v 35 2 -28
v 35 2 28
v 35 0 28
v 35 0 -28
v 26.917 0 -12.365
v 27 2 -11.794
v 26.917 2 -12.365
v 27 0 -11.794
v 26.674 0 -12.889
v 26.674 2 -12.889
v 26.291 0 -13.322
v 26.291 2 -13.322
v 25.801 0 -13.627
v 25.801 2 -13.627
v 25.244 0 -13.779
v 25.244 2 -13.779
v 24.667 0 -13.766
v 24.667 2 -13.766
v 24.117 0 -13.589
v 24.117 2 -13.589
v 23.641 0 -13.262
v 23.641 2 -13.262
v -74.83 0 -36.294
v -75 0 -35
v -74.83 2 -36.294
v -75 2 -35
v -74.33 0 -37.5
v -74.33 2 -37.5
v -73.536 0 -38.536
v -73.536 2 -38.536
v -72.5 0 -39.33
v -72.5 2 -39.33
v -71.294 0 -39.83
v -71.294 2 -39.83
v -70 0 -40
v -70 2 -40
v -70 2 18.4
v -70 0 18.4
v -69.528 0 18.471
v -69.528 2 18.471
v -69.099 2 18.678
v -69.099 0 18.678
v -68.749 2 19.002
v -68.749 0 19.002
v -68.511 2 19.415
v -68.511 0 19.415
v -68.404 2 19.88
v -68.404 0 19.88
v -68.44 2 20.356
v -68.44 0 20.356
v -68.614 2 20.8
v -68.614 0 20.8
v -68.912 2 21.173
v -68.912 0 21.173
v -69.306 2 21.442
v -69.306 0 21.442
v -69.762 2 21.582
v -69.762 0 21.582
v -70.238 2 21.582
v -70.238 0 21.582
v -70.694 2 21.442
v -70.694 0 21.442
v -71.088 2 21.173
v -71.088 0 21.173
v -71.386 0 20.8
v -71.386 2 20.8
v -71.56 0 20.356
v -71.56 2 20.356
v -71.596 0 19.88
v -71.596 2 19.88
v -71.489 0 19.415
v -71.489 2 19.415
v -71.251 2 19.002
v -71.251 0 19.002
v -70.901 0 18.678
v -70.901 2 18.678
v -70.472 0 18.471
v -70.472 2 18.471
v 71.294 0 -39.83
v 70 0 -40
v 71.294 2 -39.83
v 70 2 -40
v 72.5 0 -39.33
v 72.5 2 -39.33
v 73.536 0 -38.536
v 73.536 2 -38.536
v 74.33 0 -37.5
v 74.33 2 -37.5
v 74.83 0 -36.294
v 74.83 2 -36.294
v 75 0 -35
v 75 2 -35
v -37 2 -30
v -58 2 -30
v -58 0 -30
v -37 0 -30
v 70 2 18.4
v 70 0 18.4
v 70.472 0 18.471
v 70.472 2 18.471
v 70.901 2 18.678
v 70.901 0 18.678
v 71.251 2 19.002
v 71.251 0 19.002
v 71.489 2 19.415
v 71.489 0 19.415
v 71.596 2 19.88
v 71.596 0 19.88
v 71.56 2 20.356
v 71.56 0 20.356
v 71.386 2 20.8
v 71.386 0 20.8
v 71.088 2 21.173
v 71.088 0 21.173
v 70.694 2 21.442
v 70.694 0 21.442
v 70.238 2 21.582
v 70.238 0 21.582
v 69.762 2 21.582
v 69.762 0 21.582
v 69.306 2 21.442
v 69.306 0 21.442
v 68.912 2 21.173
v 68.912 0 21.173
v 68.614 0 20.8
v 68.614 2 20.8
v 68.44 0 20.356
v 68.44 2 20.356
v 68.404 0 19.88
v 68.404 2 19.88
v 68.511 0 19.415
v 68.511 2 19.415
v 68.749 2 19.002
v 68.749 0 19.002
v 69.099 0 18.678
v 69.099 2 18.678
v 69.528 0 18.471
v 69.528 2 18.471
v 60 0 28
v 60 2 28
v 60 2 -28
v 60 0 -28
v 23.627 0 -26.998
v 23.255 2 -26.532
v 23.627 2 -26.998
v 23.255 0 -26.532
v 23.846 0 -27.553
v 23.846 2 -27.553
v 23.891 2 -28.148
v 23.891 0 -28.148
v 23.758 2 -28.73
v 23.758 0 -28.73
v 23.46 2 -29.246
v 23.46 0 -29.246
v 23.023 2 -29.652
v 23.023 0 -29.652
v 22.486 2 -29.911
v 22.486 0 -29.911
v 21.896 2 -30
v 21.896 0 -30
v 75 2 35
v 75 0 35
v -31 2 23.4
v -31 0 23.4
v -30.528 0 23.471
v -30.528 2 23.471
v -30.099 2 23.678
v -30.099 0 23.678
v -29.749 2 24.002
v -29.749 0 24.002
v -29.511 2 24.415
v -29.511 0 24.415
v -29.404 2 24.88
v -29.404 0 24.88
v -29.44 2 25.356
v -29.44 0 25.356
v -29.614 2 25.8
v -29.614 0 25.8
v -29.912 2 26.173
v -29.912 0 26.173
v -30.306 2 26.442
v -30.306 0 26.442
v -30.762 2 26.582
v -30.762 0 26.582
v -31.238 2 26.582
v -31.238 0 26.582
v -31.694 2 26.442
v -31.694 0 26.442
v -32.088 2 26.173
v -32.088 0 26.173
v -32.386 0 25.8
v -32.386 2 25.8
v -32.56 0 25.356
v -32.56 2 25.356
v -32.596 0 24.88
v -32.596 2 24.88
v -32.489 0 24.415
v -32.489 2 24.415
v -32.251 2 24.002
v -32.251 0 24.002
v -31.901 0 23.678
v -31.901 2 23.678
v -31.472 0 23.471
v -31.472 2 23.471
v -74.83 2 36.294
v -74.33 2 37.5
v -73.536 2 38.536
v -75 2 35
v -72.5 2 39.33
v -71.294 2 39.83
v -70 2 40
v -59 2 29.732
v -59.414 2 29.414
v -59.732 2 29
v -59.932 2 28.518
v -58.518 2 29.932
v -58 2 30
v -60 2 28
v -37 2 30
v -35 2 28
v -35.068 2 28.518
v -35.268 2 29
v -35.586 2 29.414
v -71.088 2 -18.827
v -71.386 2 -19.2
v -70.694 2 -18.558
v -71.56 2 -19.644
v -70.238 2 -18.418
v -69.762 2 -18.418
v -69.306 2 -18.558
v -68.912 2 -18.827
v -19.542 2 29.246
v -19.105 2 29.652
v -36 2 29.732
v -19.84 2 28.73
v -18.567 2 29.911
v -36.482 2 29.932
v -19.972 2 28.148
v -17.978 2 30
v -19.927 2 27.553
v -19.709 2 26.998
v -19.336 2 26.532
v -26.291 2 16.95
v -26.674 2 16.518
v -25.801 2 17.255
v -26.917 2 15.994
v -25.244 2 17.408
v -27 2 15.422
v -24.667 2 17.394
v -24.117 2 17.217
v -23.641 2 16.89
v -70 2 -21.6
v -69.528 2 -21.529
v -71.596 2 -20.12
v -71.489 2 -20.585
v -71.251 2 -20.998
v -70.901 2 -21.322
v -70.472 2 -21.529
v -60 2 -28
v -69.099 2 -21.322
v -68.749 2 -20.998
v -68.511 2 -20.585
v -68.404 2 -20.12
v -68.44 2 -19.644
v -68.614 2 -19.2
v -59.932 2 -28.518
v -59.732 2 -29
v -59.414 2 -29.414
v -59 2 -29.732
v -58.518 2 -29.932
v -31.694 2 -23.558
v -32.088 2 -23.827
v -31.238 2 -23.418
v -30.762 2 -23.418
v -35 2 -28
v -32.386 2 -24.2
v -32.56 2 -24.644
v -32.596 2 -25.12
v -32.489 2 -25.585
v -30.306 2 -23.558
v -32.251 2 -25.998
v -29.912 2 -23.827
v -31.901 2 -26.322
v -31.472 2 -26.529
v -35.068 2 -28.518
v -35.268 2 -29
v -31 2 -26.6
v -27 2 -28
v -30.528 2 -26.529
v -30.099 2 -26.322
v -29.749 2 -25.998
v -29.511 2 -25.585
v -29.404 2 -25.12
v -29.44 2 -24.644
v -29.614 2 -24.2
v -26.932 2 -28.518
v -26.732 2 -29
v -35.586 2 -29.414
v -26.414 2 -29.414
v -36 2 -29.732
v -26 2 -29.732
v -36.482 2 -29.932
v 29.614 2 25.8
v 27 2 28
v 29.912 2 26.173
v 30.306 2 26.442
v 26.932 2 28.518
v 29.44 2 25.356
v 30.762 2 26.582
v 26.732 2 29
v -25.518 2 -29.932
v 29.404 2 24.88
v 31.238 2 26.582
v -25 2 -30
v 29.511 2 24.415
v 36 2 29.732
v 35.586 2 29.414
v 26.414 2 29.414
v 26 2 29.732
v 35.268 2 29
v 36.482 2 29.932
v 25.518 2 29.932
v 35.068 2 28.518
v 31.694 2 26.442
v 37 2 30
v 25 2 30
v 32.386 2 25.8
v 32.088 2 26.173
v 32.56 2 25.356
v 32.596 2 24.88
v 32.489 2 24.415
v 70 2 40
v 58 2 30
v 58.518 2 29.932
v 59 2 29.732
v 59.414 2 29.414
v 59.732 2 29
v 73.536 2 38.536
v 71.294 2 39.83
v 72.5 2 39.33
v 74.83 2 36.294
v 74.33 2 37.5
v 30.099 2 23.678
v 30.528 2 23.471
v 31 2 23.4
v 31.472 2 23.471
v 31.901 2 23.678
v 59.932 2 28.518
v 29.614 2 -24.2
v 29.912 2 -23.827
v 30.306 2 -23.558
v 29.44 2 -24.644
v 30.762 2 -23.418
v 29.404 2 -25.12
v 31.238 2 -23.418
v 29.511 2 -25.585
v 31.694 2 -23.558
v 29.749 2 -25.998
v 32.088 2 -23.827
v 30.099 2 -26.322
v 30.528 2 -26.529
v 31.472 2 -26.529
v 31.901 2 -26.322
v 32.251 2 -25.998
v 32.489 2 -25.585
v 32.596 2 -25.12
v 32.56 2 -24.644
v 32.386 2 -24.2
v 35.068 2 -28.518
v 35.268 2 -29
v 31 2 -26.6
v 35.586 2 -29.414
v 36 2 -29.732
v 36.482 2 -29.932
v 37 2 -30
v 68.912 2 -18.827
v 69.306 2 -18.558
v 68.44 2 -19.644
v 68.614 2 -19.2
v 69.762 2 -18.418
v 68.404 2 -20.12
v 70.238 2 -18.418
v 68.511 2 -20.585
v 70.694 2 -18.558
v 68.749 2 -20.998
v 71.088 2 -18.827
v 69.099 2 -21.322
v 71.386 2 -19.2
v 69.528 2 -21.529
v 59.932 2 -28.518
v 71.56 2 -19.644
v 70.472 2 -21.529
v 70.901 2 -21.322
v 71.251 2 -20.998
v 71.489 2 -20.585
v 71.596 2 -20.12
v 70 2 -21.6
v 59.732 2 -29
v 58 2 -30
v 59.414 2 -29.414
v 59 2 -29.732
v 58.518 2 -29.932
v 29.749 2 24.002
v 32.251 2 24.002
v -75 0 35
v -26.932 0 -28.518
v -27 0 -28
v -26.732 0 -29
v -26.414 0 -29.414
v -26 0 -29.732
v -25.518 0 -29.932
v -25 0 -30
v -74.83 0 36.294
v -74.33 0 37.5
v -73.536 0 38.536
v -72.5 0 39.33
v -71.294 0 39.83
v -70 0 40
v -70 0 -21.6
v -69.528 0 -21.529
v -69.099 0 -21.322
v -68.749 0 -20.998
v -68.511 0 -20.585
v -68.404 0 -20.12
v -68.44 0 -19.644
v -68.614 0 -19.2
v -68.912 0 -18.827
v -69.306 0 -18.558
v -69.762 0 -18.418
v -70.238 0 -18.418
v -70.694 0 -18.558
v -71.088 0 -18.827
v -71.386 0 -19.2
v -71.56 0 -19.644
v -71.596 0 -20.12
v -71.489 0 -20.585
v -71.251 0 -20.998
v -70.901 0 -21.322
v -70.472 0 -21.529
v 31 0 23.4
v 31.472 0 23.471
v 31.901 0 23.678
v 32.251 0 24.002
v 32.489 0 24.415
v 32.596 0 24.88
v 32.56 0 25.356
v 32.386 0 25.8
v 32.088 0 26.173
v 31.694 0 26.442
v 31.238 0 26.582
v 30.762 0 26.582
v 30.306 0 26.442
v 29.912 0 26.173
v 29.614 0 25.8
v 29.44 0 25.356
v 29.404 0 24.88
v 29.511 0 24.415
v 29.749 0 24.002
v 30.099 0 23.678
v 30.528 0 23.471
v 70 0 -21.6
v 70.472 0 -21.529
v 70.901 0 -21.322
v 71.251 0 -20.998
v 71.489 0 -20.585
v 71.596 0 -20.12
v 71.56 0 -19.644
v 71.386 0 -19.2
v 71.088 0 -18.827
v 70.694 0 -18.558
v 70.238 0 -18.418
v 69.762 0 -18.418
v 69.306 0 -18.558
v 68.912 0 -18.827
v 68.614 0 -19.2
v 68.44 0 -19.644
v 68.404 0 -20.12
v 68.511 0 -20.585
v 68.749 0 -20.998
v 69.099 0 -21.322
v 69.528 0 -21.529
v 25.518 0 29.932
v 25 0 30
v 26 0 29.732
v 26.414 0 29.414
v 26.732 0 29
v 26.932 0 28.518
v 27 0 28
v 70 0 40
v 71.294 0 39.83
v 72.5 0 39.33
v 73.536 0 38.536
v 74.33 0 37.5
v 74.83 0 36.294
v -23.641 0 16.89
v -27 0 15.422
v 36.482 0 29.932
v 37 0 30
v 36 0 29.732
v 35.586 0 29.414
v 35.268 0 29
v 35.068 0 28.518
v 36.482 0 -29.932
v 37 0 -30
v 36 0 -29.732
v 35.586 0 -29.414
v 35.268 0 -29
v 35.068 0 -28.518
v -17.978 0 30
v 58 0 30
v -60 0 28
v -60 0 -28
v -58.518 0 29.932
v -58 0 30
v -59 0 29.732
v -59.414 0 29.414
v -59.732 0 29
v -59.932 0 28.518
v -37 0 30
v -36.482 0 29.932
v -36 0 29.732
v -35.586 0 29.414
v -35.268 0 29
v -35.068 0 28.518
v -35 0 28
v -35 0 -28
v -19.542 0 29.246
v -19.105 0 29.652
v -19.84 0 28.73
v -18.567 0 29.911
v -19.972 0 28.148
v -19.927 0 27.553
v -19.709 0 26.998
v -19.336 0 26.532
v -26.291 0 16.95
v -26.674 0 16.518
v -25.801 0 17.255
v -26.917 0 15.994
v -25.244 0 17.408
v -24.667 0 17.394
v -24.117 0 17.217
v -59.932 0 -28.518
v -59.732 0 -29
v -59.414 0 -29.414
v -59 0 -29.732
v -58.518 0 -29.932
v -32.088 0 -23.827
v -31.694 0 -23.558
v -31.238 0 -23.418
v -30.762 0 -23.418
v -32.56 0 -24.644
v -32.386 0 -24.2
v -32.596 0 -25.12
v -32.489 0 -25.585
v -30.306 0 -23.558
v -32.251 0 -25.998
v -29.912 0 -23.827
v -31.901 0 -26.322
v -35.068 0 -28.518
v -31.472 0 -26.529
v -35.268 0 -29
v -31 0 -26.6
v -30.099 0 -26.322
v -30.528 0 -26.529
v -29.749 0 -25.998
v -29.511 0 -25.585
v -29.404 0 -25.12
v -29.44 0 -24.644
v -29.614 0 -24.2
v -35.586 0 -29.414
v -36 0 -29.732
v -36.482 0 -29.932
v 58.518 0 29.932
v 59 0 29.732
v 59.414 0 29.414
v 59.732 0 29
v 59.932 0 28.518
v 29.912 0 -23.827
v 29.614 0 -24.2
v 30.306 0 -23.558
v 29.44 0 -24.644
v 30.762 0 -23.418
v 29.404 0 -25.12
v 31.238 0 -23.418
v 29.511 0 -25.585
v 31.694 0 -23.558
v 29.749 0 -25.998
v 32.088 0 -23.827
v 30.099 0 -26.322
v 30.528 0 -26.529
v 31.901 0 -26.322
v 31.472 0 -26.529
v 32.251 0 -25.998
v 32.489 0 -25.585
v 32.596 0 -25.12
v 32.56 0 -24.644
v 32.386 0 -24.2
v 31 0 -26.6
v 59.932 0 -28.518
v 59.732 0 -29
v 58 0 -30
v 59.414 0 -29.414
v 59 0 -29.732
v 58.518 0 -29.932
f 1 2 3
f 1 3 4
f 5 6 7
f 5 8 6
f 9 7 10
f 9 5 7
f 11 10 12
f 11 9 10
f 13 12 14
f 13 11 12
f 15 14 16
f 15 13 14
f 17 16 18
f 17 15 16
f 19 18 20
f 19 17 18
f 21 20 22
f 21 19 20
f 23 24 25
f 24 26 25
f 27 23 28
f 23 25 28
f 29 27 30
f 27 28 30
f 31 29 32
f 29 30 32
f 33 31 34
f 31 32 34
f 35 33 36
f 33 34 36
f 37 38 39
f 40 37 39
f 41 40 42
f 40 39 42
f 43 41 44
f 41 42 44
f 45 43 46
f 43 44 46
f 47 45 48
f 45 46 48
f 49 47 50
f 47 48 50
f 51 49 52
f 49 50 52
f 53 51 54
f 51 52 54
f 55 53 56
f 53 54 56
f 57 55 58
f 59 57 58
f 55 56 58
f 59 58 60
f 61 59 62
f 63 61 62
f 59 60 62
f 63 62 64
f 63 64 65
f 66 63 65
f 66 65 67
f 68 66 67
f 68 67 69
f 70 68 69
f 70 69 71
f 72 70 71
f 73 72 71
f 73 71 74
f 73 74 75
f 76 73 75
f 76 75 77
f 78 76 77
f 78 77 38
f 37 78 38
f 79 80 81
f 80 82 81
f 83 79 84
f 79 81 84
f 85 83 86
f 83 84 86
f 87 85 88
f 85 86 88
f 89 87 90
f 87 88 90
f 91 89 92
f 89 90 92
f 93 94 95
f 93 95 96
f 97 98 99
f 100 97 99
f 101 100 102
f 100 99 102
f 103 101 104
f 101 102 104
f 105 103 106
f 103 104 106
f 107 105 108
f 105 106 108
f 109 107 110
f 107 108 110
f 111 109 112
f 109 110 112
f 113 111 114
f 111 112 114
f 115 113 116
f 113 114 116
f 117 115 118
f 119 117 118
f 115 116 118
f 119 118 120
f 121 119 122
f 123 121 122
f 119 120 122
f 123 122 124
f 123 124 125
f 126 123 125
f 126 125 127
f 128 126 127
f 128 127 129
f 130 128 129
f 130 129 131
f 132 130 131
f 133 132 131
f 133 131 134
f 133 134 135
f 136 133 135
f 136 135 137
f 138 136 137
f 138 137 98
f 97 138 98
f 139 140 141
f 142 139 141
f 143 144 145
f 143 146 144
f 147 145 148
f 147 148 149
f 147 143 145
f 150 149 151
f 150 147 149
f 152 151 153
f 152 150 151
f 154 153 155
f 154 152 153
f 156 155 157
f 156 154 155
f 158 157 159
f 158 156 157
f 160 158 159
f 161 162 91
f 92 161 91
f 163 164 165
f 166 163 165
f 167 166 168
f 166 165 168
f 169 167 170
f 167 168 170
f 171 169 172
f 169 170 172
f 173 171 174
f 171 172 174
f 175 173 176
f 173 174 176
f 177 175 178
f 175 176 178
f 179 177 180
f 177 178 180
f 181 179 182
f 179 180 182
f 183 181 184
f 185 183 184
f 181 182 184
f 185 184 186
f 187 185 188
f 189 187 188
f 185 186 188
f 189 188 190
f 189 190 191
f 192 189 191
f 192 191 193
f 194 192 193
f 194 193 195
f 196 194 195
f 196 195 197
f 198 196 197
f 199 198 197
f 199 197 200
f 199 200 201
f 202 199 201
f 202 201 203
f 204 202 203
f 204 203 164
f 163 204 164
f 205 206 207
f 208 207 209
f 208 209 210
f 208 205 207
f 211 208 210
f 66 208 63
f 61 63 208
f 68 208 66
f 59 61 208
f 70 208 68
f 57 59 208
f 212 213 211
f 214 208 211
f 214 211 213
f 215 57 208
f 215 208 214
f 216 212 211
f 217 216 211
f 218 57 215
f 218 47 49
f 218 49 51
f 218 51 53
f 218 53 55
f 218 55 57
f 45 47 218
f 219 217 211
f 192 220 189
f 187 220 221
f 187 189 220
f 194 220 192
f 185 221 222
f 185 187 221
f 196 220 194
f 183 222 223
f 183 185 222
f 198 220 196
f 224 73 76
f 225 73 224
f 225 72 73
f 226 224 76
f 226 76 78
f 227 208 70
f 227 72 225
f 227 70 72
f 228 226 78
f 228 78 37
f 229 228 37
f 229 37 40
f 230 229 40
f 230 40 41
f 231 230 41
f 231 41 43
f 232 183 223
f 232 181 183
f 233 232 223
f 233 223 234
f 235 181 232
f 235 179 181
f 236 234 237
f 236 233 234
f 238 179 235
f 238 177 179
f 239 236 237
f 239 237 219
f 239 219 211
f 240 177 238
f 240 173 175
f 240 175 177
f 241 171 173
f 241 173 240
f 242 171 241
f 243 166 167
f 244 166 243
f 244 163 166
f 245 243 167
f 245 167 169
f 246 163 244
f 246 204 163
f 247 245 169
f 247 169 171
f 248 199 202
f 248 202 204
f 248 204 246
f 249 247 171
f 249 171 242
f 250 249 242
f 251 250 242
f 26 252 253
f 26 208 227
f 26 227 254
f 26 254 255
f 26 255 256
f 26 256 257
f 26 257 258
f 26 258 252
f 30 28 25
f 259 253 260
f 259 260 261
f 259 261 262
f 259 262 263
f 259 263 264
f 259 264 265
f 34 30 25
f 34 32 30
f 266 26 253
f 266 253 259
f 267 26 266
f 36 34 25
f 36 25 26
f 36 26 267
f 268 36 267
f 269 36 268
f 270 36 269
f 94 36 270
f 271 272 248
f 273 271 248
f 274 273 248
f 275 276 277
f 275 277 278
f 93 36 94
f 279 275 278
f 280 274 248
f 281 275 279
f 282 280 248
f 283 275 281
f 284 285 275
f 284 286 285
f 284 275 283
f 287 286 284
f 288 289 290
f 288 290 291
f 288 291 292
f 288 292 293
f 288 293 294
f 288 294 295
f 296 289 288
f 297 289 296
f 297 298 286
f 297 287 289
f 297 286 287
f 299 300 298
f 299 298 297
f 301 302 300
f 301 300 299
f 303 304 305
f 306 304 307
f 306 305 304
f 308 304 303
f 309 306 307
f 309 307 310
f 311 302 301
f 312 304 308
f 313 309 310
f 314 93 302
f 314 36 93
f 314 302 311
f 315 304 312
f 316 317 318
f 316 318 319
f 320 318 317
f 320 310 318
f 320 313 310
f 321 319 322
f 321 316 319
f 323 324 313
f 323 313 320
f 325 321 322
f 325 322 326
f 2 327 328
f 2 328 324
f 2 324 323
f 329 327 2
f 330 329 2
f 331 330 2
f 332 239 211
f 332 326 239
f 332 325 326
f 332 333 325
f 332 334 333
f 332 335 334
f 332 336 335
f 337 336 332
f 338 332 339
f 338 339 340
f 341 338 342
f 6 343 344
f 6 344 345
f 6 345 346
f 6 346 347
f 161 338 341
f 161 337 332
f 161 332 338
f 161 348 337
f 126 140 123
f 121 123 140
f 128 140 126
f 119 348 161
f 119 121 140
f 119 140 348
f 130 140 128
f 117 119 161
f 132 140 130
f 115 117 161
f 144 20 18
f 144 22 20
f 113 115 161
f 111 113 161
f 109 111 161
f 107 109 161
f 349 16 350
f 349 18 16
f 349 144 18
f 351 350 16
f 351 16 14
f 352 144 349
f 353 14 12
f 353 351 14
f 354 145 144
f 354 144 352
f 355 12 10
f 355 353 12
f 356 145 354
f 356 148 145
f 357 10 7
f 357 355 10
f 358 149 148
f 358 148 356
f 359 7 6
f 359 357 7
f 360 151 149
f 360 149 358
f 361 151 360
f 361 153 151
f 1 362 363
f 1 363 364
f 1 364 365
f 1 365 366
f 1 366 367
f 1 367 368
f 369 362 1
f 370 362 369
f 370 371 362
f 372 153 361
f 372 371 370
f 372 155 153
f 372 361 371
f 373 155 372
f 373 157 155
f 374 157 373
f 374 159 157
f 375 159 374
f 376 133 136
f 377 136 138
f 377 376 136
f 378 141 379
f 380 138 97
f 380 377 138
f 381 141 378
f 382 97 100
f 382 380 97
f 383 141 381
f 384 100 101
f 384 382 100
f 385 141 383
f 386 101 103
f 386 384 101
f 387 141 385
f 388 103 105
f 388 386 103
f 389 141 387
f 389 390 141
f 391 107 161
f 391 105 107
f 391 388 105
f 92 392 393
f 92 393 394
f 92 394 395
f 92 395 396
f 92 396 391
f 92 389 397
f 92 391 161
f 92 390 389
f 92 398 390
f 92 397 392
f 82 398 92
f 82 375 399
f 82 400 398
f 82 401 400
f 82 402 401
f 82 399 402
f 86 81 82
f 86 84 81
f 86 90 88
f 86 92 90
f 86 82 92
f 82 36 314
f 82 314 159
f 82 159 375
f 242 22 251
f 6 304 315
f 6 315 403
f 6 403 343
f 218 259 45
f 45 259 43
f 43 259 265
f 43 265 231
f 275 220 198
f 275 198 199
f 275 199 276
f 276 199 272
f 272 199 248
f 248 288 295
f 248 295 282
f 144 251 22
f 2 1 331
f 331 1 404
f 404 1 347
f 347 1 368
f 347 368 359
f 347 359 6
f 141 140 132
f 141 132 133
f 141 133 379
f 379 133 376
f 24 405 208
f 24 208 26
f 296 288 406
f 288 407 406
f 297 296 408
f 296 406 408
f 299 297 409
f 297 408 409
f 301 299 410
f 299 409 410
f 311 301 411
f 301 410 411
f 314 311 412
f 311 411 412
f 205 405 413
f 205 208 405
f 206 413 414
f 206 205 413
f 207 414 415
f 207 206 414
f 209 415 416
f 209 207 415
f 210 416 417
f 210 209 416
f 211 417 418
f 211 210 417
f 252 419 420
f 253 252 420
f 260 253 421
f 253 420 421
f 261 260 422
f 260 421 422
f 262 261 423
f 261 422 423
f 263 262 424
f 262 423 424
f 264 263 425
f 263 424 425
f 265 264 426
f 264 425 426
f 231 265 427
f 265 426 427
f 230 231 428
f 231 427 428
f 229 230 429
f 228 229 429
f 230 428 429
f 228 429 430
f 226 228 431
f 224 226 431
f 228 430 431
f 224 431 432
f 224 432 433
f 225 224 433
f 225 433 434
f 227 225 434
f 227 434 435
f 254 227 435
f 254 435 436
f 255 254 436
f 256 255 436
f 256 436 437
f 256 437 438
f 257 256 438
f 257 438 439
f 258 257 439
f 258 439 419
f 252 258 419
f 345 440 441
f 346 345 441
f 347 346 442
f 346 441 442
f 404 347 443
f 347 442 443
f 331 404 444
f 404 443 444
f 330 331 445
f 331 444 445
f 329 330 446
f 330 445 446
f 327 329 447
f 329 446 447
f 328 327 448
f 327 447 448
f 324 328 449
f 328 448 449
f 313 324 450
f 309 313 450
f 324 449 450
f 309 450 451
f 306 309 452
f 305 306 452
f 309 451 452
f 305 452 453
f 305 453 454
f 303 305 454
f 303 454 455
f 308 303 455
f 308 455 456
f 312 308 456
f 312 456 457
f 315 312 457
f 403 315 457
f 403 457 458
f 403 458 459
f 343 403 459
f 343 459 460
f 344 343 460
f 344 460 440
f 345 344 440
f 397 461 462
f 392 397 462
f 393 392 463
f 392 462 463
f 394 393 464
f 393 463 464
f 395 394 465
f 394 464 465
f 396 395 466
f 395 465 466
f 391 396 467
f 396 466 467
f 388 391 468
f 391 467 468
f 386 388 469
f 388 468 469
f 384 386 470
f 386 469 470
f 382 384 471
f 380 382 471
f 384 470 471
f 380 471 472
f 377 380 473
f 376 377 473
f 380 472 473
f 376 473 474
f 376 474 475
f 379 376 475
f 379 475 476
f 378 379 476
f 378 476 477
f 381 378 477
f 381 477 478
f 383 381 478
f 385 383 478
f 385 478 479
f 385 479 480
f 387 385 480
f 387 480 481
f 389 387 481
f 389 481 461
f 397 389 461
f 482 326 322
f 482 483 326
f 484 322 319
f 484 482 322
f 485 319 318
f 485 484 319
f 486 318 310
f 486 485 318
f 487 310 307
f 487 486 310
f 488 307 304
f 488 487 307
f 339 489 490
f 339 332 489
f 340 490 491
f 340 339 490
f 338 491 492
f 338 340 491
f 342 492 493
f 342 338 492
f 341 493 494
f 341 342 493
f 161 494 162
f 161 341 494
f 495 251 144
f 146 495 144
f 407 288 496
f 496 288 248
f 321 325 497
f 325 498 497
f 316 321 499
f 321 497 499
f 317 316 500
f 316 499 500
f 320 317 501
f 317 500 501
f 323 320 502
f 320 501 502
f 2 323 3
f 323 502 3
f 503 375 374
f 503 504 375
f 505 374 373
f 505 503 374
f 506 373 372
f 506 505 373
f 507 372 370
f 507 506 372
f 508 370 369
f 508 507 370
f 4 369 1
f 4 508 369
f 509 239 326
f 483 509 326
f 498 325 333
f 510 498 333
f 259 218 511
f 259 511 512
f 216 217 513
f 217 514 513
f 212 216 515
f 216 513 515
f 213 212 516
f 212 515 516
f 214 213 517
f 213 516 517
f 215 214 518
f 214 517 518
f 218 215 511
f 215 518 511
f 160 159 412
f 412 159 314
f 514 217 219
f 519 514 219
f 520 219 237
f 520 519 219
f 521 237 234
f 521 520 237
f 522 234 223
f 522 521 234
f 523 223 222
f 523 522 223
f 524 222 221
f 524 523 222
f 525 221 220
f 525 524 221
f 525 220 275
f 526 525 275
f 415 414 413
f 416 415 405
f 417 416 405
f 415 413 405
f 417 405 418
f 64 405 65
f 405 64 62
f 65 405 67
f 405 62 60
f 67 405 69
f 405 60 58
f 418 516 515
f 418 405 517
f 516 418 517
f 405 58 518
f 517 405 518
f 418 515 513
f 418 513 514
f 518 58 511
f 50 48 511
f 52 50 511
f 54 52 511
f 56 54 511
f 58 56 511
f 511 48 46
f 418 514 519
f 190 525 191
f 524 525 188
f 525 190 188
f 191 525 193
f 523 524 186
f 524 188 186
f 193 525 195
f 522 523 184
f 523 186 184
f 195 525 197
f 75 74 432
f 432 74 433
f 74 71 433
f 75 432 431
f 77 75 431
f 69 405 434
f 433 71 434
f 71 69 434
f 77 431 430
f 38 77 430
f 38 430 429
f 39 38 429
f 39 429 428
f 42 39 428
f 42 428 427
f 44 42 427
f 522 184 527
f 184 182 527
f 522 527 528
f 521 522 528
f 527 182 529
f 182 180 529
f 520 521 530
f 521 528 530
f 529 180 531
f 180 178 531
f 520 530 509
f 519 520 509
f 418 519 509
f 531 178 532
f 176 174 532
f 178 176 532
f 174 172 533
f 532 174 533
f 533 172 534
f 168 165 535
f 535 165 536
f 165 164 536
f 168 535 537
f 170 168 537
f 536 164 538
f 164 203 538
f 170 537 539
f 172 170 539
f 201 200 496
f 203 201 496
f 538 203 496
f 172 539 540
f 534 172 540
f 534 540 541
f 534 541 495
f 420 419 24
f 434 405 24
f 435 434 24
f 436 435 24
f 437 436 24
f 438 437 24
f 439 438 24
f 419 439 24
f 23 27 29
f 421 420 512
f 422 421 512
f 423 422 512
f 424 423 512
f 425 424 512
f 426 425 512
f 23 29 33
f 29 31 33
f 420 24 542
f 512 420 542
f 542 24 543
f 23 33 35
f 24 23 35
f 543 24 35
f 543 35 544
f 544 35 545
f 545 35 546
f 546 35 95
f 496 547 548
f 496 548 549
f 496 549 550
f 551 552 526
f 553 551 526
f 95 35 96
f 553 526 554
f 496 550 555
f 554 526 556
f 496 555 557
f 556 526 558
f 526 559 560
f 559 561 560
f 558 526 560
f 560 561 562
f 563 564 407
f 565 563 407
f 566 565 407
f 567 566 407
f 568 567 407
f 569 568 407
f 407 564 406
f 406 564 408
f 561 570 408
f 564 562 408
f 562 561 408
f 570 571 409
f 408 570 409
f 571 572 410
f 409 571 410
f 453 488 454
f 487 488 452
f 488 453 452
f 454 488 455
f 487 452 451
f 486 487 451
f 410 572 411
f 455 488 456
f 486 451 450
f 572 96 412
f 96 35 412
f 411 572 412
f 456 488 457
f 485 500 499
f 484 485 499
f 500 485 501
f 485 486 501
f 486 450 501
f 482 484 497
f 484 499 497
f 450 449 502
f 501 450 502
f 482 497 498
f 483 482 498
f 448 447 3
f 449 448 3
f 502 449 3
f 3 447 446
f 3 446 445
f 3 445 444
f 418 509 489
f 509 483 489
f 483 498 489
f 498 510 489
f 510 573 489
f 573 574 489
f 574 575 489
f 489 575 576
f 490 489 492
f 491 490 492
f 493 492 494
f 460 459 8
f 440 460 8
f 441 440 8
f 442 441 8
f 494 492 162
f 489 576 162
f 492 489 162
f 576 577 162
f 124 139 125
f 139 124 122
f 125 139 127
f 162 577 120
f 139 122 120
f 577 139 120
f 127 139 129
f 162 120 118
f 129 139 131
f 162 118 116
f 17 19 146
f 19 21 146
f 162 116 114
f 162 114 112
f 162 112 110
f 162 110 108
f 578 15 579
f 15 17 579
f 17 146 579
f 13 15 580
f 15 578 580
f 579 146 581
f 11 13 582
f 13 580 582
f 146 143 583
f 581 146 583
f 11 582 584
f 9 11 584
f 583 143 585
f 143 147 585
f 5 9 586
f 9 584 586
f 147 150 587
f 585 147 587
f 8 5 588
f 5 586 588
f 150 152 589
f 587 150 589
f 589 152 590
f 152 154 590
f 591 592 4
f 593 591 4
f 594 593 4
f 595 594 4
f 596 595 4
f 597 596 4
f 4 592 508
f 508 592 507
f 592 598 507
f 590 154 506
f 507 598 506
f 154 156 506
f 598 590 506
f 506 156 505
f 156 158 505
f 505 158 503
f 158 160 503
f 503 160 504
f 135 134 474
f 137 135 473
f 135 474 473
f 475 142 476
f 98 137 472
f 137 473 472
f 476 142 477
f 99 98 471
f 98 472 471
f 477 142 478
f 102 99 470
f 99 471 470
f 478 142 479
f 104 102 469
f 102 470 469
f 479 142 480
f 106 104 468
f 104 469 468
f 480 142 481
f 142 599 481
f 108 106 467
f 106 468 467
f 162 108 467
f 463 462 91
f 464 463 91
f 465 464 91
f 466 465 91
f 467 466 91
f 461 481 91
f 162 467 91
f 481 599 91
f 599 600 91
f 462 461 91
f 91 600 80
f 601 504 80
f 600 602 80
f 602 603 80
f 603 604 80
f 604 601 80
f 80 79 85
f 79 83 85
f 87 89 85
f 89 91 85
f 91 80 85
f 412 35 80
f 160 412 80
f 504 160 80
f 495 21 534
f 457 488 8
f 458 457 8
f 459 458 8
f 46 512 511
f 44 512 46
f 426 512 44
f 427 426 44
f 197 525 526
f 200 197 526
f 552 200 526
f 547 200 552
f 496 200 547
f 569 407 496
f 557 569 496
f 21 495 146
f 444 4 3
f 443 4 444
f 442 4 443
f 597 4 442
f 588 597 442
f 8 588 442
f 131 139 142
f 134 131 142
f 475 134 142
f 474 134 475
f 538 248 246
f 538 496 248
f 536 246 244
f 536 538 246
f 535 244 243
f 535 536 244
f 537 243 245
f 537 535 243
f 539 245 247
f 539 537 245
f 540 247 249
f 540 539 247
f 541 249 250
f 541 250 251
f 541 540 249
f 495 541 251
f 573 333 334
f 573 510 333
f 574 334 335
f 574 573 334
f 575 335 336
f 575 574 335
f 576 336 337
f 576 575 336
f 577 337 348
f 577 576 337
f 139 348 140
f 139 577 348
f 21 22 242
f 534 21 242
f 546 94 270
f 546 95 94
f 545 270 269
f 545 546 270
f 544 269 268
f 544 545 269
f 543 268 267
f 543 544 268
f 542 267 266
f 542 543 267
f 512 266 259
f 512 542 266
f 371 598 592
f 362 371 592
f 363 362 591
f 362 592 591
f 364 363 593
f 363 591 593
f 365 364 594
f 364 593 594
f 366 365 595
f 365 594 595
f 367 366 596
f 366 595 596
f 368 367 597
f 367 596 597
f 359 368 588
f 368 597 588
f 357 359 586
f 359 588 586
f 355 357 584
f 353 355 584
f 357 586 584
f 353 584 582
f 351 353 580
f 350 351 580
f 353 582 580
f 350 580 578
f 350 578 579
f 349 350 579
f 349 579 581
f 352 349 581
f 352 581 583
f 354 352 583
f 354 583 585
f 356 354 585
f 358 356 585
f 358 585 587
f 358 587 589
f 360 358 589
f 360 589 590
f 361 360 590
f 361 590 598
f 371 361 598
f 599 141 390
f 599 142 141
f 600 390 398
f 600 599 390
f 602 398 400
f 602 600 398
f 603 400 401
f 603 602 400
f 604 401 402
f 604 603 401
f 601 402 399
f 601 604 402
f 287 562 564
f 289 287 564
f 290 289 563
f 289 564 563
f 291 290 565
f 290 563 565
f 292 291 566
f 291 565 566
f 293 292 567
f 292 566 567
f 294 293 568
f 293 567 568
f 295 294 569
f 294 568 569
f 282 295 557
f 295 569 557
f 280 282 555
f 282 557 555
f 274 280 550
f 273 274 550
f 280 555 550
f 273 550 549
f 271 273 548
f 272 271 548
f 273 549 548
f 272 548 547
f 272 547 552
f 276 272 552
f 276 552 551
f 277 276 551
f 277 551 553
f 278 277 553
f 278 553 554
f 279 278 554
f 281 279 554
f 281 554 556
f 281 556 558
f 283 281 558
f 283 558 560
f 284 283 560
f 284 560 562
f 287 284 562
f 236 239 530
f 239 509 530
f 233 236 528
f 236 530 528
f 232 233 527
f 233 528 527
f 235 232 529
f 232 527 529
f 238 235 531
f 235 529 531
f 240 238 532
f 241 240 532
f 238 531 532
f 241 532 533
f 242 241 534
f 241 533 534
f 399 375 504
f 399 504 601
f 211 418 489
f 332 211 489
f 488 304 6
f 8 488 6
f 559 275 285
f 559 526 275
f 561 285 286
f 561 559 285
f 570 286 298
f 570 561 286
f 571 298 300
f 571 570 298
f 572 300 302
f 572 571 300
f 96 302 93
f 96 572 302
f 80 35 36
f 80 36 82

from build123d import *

# Parameters (mm, degrees)
SKETCH_1_W              = 150
SKETCH_1_H              = 80
EXTRUDE_1_DEPTH         = 2
HOLE_WIZARD_3_2_3_2_1_D = 3.2
FILLET_1_R              = 5
SKETCH_4_W              = 25
SKETCH_4_H              = 60
CUT_EXTRUDE_1_DEPTH     = 86.023526156
FILLET_2_R              = 2


with BuildPart() as part:
    # 草图1 → 凸台-拉伸1 (new body)
    with BuildSketch(Plane(origin=(0, 0, 0), x_dir=(1, 0, 0), z_dir=(0, 1, 0))):
        Rectangle(SKETCH_1_W, SKETCH_1_H)
    extrude(amount=EXTRUDE_1_DEPTH)

    # Ø3.2 (3.2) 直径孔1 (through all)
    with Locations(Plane(origin=(-31, 2, -25), x_dir=(0, 0, 1), z_dir=(0, 1, 0))):
        with Locations((0, 0), (50, 0), (50, 62), (0, 62), (5, -39), (45, -39), (45, 101), (5, 101)):
            Hole(HOLE_WIZARD_3_2_3_2_1_D / 2)

    # 圆角1
    fillet_1_edges = [part.edges().sort_by_distance(p)[0] for p in [
        (75, 1, 40),
        (-75, 1, 40),
        (-75, 1, -40),
        (75, 1, -40),
    ]]
    fillet(fillet_1_edges, radius=FILLET_1_R)

    # 草图4 → 切除-拉伸1 (cut, through all)
    with BuildSketch(Plane(origin=(0, 2, 0), x_dir=(1, 0, 0), z_dir=(0, 1, 0))):
        with Locations((-47.5, 0)):
            Rectangle(SKETCH_4_W, SKETCH_4_H)
        Polygon((-27, 30), (-27, -20), (27, 30), align=None)
        Polygon((-23.081304406, -30), (27, -30), (27, 16.371578153), align=None)
        with Locations((47.5, 0)):
            Rectangle(SKETCH_4_W, SKETCH_4_H)
    extrude(amount=-CUT_EXTRUDE_1_DEPTH, mode=Mode.SUBTRACT)

    # 圆角2
    fillet_2_edges = [part.edges().sort_by_distance(p)[0] for p in [
        (-60, 1, 30),
        (-60, 1, -30),
        (-35, 1, -30),
        (-35, 1, 30),
        (-23.081304406, 1, 30),
        (27, 1, -16.371578153),
        (27, 1, 30),
        (-27, 1, -30),
        (27, 1, -30),
        (-27, 1, 20),
        (60, 1, -30),
        (60, 1, 30),
        (35, 1, 30),
        (35, 1, -30),
    ]]
    fillet(fillet_2_edges, radius=FILLET_2_R)


solid = part.part
